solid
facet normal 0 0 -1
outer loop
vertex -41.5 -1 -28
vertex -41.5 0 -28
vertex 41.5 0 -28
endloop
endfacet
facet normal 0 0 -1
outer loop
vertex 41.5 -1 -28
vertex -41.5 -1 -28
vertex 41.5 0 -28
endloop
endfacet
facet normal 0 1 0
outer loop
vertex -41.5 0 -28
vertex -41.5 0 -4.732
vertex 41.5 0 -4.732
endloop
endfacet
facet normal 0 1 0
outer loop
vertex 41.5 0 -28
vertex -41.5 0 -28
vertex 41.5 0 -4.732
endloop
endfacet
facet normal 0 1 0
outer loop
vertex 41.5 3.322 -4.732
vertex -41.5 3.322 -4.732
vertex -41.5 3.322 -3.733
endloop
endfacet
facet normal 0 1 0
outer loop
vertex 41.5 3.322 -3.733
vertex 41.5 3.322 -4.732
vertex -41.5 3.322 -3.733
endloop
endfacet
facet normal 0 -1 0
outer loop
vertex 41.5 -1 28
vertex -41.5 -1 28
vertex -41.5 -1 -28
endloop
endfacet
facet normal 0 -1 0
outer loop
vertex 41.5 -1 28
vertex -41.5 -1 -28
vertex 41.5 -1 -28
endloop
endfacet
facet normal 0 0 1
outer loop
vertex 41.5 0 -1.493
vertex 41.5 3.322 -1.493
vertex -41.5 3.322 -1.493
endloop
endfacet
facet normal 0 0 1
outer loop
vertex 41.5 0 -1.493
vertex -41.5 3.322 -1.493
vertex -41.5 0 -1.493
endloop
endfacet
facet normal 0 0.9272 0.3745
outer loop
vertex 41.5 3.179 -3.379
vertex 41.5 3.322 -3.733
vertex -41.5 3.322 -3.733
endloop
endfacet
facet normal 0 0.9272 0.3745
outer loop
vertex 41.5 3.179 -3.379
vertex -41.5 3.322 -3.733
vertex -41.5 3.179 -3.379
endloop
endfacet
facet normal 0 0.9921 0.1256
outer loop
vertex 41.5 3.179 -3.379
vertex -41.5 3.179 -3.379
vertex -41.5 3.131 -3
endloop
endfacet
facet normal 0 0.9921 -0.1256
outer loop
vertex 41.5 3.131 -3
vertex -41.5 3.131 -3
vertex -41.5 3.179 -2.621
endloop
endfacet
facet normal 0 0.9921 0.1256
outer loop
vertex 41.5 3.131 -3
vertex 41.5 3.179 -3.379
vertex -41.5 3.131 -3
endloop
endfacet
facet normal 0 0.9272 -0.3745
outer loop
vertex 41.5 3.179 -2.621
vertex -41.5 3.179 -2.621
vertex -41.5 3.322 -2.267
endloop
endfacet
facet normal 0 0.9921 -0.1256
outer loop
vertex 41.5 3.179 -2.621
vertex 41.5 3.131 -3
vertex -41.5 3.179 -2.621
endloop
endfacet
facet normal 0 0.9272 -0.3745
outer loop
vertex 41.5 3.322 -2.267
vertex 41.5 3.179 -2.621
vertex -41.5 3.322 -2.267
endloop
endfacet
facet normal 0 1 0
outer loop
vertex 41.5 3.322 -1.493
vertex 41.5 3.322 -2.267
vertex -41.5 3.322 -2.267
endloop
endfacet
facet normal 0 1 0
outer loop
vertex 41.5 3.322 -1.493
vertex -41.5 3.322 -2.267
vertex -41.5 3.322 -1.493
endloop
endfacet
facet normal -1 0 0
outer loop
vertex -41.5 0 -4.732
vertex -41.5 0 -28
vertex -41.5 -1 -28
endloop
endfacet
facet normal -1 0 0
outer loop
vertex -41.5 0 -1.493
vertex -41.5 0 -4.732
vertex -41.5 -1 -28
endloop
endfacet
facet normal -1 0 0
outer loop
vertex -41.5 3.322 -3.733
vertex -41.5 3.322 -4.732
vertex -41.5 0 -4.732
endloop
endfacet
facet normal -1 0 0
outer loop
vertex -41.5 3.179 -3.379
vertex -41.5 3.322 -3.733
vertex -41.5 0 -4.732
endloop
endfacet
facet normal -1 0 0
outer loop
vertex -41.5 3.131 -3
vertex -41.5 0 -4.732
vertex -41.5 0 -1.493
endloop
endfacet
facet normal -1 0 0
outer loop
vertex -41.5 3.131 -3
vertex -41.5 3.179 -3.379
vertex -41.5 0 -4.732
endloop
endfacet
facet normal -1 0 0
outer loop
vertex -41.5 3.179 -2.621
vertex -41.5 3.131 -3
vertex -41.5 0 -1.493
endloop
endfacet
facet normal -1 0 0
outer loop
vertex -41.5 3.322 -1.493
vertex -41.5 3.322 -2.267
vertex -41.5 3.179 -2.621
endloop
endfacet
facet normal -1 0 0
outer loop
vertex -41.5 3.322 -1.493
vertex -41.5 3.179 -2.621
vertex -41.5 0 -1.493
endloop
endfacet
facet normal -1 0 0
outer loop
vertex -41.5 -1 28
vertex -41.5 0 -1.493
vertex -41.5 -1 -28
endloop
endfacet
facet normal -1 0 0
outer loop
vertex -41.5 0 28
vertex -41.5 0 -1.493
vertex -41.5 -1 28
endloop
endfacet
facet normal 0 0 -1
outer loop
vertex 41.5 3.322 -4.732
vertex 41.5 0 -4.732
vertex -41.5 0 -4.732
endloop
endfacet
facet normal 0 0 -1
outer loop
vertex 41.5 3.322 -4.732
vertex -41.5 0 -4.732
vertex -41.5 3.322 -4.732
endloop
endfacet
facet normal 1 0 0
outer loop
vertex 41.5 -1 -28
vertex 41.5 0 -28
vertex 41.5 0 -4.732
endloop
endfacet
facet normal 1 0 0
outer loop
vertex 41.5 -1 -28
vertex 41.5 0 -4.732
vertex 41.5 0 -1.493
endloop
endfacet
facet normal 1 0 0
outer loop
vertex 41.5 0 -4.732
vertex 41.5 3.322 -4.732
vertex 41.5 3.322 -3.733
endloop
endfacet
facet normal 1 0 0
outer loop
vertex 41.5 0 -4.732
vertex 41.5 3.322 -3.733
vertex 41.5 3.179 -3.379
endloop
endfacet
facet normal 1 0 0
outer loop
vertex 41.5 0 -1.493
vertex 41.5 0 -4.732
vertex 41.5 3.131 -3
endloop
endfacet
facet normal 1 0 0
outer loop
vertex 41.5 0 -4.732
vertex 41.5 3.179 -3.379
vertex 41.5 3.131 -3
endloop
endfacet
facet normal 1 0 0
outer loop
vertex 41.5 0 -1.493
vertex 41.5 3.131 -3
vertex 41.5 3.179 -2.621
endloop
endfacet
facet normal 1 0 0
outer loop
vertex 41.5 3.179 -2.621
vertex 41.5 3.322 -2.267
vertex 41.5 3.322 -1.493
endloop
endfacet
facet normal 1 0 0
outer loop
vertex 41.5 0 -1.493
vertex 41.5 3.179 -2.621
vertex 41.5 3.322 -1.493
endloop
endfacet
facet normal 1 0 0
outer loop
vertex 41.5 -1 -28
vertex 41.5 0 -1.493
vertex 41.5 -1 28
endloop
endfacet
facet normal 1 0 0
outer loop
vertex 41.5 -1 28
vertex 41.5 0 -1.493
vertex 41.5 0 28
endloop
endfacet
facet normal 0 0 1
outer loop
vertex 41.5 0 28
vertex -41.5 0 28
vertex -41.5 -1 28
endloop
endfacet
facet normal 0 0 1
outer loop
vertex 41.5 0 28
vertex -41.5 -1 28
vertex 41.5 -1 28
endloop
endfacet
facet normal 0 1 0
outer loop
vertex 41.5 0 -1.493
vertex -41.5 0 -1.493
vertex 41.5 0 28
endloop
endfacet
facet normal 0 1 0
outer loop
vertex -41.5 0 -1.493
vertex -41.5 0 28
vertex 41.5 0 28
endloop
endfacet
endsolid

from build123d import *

# Parameters (mm, degrees)
F0_W     = 83
F0_H     = 56
F1_DEPTH = 1
F3_DEPTH = 83


# Not quite as in the source:
# - a feature names something its author has since deleted; it is built from what else it names


with BuildPart() as f1:
    # F0 (on Front) → F1 (new body)
    with BuildSketch(Plane.XZ):
        Rectangle(F0_W, F0_H)
    extrude(amount=F1_DEPTH)

    # F2 (on face) → F3 (join)
    with BuildSketch(Plane.YZ.offset(41.5)):
        with BuildLine():
            ThreePointArc((3.3219824545, -3.733111607), (3.130625787, -3), (3.3219824545, -2.266888393))
            Line((3.3219824545, -2.266888393), (3.3219824545, -1.492598909))
            Line((3.3219824545, -1.492598909), (0, -1.492598909))
            Line((0, -1.492598909), (0, -4.7320667654))
            Line((0, -4.7320667654), (3.3219824545, -4.7320667654))
            Line((3.3219824545, -4.7320667654), (3.3219824545, -3.733111607))
        make_face()
        with BuildLine():
            ThreePointArc((0, 27.0385164807), (-0.1, 26.5), (0, 25.9614835193))
            Line((0, 25.9614835193), (0, 27.0385164807))
        make_face()
    extrude(amount=-F3_DEPTH)


solid = f1.part
